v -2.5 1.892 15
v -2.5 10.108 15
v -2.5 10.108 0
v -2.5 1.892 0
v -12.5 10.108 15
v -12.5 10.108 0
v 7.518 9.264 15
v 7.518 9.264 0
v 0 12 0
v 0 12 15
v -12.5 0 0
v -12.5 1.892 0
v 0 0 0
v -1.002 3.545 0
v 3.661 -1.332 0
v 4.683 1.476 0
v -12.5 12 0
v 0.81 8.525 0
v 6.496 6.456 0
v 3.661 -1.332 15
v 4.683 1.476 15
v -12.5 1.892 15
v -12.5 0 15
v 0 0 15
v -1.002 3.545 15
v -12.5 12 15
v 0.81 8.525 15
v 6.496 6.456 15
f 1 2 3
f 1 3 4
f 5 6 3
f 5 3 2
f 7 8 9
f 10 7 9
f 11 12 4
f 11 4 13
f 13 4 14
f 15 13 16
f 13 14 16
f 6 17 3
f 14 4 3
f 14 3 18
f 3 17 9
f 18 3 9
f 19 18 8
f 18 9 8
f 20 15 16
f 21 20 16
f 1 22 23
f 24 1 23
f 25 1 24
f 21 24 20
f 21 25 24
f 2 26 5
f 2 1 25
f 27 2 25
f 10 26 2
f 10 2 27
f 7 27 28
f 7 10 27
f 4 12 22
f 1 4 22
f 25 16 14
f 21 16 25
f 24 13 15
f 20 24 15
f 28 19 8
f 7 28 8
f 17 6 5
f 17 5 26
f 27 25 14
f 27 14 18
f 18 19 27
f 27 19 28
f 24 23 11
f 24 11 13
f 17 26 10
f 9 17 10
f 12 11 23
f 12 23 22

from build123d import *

# Parameters (mm, degrees)
F0_W     = 12.5
F0_H     = 12
F1_DEPTH = 15
F2_W     = 8.215
F2_H     = 15
F3_DEPTH = 10
F4_W     = 5.3
F4_H     = 15
F5_DEPTH = 6.05


with BuildPart() as f1:
    # F0 (on Top) → F1 (new body)
    with BuildSketch(Plane.XY):
        with Locations((-6.25, 6)):
            Rectangle(F0_W, F0_H)
        Polygon((0, 12), (0, 0), (3.6608153082, -1.3324278053), (7.5175409663, 9.2638388534), align=None)
    extrude(amount=F1_DEPTH)

    # F2 (on face) → F3 (cut)
    with BuildSketch(Plane(origin=(-12.5, 0, 0), x_dir=(0, -1, 0), z_dir=(-1, 0, 0))):
        with Locations((-6, 7.5)):
            Rectangle(F2_W, F2_H)
    extrude(amount=-F3_DEPTH, mode=Mode.SUBTRACT)

    # F4 (on face) → F5 (cut)
    with BuildSketch(Plane(origin=(3.6608153082, -1.3324278053, 0), x_dir=(0.3420201433, 0.9396926208, 0), z_dir=(0.9396926208, -0.3420201433, 0))):
        with Locations((5.6381557247, 7.5)):
            Rectangle(F4_W, F4_H)
    extrude(amount=-F5_DEPTH, mode=Mode.SUBTRACT)


solid = f1.part
